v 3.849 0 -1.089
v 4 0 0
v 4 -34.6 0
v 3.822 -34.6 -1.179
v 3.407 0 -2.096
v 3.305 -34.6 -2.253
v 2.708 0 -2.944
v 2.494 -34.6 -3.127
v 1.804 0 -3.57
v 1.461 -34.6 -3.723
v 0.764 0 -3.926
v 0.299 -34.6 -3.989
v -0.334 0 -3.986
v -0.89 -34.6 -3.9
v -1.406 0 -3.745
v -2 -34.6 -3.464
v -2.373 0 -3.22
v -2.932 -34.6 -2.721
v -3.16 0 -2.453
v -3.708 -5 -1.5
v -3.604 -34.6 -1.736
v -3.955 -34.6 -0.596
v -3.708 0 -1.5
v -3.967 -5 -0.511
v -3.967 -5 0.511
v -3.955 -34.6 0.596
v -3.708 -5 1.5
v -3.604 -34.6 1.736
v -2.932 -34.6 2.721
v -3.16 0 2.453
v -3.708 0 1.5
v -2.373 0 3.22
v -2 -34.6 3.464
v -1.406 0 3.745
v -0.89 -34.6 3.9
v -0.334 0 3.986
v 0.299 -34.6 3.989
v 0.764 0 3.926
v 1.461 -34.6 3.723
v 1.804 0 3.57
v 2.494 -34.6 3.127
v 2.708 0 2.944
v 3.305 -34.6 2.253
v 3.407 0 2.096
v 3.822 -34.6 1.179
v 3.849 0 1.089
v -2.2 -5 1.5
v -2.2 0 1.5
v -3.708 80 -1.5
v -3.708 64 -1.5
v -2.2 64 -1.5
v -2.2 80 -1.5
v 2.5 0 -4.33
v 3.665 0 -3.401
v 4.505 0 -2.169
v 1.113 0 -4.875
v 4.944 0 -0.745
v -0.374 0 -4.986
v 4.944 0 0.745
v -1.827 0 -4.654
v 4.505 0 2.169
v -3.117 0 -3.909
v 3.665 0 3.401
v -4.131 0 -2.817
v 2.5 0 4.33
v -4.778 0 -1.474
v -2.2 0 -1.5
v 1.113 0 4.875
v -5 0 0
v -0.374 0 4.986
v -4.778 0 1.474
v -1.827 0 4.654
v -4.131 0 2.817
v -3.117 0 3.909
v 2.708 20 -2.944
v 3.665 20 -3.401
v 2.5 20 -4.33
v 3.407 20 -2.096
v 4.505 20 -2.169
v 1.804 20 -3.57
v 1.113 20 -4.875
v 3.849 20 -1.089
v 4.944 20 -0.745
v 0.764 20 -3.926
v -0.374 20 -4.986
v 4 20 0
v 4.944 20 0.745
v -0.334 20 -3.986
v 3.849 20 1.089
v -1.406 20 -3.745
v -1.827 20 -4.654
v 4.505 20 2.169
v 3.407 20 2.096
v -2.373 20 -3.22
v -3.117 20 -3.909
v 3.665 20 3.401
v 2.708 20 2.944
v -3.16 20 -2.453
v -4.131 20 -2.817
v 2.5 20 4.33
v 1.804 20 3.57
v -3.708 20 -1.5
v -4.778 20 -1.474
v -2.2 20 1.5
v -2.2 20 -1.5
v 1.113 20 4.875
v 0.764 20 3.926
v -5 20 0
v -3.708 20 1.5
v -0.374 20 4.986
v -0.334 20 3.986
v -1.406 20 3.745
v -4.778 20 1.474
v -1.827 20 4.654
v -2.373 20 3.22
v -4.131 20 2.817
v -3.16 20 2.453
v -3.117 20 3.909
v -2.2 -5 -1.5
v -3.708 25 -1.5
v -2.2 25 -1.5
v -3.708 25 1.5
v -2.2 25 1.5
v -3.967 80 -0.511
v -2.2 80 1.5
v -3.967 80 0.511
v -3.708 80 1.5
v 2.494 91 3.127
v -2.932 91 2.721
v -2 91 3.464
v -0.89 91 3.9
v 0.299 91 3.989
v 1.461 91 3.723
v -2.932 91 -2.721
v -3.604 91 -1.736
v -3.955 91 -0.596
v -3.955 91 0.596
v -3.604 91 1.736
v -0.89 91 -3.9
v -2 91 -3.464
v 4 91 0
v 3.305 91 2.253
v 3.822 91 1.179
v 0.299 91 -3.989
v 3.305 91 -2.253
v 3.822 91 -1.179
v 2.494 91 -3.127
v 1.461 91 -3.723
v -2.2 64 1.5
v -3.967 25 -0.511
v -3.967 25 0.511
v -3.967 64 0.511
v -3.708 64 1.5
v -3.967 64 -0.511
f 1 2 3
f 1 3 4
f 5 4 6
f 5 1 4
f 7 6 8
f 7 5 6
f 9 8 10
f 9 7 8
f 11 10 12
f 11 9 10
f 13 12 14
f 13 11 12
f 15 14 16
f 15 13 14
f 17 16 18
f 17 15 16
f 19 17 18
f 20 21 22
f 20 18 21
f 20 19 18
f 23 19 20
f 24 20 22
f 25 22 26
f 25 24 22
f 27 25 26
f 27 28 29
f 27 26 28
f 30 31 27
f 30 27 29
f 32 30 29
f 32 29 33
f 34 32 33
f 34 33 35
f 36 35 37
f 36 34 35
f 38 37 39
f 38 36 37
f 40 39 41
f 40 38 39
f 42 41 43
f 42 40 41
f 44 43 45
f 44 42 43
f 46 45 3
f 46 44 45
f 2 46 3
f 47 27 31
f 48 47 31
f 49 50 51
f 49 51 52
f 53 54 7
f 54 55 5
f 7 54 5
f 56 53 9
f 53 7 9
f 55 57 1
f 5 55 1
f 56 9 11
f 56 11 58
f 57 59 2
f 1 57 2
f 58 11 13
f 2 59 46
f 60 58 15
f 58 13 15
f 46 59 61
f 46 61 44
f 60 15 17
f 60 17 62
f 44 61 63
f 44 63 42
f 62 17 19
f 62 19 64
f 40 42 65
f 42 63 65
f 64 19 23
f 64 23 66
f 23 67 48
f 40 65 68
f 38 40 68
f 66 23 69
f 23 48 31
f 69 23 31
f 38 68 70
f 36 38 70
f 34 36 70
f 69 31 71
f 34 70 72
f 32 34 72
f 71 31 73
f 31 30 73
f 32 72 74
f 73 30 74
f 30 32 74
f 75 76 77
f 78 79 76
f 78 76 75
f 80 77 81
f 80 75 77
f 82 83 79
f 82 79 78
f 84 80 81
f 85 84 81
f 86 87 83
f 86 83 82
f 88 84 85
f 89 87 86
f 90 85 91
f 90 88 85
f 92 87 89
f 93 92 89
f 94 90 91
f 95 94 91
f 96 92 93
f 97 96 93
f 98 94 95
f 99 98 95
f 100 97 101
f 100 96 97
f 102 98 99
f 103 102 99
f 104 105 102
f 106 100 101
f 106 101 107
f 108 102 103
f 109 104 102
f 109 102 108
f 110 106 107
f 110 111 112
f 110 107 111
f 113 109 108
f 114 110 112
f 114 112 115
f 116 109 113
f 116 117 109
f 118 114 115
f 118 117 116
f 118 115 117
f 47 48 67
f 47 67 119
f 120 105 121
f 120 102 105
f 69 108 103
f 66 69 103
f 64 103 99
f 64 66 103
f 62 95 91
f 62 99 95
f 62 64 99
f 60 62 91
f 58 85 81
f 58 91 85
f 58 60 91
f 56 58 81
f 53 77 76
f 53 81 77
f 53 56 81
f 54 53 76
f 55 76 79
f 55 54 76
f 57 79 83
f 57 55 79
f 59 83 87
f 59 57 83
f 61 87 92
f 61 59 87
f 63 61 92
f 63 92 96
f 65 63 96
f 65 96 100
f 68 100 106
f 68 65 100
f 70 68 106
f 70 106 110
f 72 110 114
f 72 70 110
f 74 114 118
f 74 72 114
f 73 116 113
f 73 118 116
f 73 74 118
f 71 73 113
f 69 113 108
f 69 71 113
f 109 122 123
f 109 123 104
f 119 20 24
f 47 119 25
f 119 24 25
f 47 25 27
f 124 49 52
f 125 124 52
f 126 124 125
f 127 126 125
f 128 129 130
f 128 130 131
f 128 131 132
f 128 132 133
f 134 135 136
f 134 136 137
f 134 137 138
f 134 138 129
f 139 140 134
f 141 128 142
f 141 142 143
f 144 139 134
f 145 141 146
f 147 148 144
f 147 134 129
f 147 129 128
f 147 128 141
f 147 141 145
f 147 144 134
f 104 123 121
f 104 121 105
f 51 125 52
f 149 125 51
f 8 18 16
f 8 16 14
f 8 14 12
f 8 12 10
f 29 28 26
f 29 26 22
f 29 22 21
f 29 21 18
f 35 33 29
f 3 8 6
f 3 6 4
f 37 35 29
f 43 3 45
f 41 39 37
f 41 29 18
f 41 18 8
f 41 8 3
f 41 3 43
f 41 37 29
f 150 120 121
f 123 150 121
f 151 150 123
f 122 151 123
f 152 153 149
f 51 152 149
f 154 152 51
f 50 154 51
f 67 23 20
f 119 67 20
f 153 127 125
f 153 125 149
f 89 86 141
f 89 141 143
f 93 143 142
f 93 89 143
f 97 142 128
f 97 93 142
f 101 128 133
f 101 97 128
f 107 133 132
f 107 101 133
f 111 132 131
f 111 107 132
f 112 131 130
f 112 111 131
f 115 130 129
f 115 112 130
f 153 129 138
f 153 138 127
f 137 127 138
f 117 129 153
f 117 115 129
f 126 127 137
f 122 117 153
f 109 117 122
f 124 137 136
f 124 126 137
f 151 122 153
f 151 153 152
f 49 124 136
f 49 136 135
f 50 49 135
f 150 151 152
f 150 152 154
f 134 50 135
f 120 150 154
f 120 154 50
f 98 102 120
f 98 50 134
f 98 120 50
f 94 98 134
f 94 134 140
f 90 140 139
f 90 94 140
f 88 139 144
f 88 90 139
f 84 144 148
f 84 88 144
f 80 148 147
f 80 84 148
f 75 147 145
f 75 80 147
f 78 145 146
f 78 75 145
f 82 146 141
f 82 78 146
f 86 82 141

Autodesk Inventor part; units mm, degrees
ref_plane "YZ Plane" through (0, 0, 0) normal (1, 0, 0) x (0, 1, 0)
sketch "スケッチ1" plane through (0, 0, 0) normal (0, 1, 0) x (-1, 0, 0)
  circle A0 centre (0, 0) radius 5
  dimension "d0" = 10
extrude "押し出し1" add sketch "スケッチ1" along normal blind 20
sketch "スケッチ2" plane through (0, 20, 0) normal (0, 1, 0) x (1, 0, 0)
  circle A0 centre (0, 0) radius 4
  dimension "d3" = 8
extrude "押し出し2" add sketch "スケッチ2" along normal blind 71
sketch "スケッチ3" plane through (0, 0, 0) normal (0, -1, 0) x (1, 0, 0)
  circle A0 centre (0, 0) radius 4
  dimension "d6" = 8
extrude "押し出し3" add sketch "スケッチ3" along normal blind 34.6
sketch "スケッチ4" plane through (0, -34.6, 0) normal (0, -1, 0) x (1, 0, 0)
  circle A0 centre (0, 0) radius 4 projected
  point P0 (0, 4)
ref_plane "作業平面1" through (0, -34.6, 4) normal (0, 0, 1) x (1, 0, 0)
sketch "スケッチ7" plane through (0, -34.6, 4) normal (0, 0, 1) x (1, 0, 0)
  line L0 (-1.5, 5) -> (1.5, 5)
  line L1 (1.5, 5) -> (1.5, 21)
  line L2 (1.5, 21) -> (-1.5, 21)
  line L3 (-1.5, 21) -> (-1.5, 5)
  line L4 (-1.5, 5) -> (1.5, 21) construction
  line L5 (1.5, 5) -> (-1.5, 21) construction
  line L6 (-4, 0) -> (4, 0) projected
  line L7 (-1.5, 104.6) -> (1.5, 104.6)
  line L8 (1.5, 104.6) -> (1.5, 120.6)
  line L9 (1.5, 120.6) -> (-1.5, 120.6)
  line L10 (-1.5, 120.6) -> (-1.5, 104.6)
  line L11 (-1.5, 104.6) -> (1.5, 120.6) construction
  line L12 (1.5, 104.6) -> (-1.5, 120.6) construction
  line L13 (4, 125.6) -> (-4, 125.6) projected
  point P0 (0, 34.6)
  point P1 (0, 13)
  point P2 (0, 112.6)
  dimension "d17" = 3
  dimension "d18" = 16
  dimension "d19" = 5
  dimension "d20" = 3
  dimension "d21" = 16
  dimension "d22" = 5
extrude "押し出し5" [suppressed]
sketch "スケッチ8" plane through (0, 20, 0) normal (0, 1, 0) x (1, 0, 0)
  circle A0 centre (0, 0) radius 5
  dimension "d25" = 10
extrude "押し出し6" [suppressed]
sketch "スケッチ9" plane through (0, 0, 0) normal (0, -1, 0) x (1, 0, 0)
  circle A0 centre (0, 0) radius 5 projected
  circle A1 centre (0, 0) radius 5
  dimension "d28" = 10
extrude "押し出し7" [suppressed]
sketch "スケッチ10" plane through (0, 0, 0) normal (0, -1, 0) x (1, 0, 0)
  circle A0 centre (0, 0) radius 4 projected
  point P0 (-4, 0)
ref_plane "作業平面2" through (-4, 0, 0) normal (-1, 0, 0) x (0, -1, 0)
sketch "スケッチ11" plane through (-4, 0, 0) normal (-1, 0, 0) x (0, -1, 0)
  line L0 (0, -1.5) -> (5, -1.5)
  line L1 (5, -1.5) -> (5, 1.5)
  line L2 (5, 1.5) -> (0, 1.5)
  line L3 (0, 1.5) -> (0, -1.5)
  line L4 (0, -1.5) -> (5, 1.5) construction
  line L5 (5, -1.5) -> (0, 1.5) construction
  line L6 (0, 5) -> (0, -5) projected
  line L7 (-25, 1.5) -> (-20, 1.5)
  line L8 (-20, 1.5) -> (-20, -1.5)
  line L9 (-20, -1.5) -> (-25, -1.5)
  line L10 (-25, -1.5) -> (-25, 1.5)
  line L11 (-25, 1.5) -> (-20, -1.5) construction
  line L12 (-20, 1.5) -> (-25, -1.5) construction
  line L13 (-20, 5) -> (-20, -5) projected
  line L14 (-80, 1.5) -> (-64, 1.5)
  line L15 (-64, 1.5) -> (-64, -1.5)
  line L16 (-64, -1.5) -> (-80, -1.5)
  line L17 (-80, -1.5) -> (-80, 1.5)
  line L18 (-80, 1.5) -> (-64, -1.5) construction
  line L19 (-64, 1.5) -> (-80, -1.5) construction
  line L20 (-91, 4) -> (-91, -4) projected
  point P0 (0, 0)
  point P1 (2.5, 0)
  point P2 (-22.5, 0)
  point P3 (-72, 0)
  dimension "d31" = 5
  dimension "d32" = 3
  dimension "d33" = 0
  dimension "d34" = 5
  dimension "d35" = 3
  dimension "d36" = 0
  dimension "d39" = 16
  dimension "d40" = 3
  dimension "d41" = 11
extrude "押し出し8" cut sketch "スケッチ11" against normal blind 1.8
properties part number "shoulder2_shaft" material "鋼、炭素鋼"
